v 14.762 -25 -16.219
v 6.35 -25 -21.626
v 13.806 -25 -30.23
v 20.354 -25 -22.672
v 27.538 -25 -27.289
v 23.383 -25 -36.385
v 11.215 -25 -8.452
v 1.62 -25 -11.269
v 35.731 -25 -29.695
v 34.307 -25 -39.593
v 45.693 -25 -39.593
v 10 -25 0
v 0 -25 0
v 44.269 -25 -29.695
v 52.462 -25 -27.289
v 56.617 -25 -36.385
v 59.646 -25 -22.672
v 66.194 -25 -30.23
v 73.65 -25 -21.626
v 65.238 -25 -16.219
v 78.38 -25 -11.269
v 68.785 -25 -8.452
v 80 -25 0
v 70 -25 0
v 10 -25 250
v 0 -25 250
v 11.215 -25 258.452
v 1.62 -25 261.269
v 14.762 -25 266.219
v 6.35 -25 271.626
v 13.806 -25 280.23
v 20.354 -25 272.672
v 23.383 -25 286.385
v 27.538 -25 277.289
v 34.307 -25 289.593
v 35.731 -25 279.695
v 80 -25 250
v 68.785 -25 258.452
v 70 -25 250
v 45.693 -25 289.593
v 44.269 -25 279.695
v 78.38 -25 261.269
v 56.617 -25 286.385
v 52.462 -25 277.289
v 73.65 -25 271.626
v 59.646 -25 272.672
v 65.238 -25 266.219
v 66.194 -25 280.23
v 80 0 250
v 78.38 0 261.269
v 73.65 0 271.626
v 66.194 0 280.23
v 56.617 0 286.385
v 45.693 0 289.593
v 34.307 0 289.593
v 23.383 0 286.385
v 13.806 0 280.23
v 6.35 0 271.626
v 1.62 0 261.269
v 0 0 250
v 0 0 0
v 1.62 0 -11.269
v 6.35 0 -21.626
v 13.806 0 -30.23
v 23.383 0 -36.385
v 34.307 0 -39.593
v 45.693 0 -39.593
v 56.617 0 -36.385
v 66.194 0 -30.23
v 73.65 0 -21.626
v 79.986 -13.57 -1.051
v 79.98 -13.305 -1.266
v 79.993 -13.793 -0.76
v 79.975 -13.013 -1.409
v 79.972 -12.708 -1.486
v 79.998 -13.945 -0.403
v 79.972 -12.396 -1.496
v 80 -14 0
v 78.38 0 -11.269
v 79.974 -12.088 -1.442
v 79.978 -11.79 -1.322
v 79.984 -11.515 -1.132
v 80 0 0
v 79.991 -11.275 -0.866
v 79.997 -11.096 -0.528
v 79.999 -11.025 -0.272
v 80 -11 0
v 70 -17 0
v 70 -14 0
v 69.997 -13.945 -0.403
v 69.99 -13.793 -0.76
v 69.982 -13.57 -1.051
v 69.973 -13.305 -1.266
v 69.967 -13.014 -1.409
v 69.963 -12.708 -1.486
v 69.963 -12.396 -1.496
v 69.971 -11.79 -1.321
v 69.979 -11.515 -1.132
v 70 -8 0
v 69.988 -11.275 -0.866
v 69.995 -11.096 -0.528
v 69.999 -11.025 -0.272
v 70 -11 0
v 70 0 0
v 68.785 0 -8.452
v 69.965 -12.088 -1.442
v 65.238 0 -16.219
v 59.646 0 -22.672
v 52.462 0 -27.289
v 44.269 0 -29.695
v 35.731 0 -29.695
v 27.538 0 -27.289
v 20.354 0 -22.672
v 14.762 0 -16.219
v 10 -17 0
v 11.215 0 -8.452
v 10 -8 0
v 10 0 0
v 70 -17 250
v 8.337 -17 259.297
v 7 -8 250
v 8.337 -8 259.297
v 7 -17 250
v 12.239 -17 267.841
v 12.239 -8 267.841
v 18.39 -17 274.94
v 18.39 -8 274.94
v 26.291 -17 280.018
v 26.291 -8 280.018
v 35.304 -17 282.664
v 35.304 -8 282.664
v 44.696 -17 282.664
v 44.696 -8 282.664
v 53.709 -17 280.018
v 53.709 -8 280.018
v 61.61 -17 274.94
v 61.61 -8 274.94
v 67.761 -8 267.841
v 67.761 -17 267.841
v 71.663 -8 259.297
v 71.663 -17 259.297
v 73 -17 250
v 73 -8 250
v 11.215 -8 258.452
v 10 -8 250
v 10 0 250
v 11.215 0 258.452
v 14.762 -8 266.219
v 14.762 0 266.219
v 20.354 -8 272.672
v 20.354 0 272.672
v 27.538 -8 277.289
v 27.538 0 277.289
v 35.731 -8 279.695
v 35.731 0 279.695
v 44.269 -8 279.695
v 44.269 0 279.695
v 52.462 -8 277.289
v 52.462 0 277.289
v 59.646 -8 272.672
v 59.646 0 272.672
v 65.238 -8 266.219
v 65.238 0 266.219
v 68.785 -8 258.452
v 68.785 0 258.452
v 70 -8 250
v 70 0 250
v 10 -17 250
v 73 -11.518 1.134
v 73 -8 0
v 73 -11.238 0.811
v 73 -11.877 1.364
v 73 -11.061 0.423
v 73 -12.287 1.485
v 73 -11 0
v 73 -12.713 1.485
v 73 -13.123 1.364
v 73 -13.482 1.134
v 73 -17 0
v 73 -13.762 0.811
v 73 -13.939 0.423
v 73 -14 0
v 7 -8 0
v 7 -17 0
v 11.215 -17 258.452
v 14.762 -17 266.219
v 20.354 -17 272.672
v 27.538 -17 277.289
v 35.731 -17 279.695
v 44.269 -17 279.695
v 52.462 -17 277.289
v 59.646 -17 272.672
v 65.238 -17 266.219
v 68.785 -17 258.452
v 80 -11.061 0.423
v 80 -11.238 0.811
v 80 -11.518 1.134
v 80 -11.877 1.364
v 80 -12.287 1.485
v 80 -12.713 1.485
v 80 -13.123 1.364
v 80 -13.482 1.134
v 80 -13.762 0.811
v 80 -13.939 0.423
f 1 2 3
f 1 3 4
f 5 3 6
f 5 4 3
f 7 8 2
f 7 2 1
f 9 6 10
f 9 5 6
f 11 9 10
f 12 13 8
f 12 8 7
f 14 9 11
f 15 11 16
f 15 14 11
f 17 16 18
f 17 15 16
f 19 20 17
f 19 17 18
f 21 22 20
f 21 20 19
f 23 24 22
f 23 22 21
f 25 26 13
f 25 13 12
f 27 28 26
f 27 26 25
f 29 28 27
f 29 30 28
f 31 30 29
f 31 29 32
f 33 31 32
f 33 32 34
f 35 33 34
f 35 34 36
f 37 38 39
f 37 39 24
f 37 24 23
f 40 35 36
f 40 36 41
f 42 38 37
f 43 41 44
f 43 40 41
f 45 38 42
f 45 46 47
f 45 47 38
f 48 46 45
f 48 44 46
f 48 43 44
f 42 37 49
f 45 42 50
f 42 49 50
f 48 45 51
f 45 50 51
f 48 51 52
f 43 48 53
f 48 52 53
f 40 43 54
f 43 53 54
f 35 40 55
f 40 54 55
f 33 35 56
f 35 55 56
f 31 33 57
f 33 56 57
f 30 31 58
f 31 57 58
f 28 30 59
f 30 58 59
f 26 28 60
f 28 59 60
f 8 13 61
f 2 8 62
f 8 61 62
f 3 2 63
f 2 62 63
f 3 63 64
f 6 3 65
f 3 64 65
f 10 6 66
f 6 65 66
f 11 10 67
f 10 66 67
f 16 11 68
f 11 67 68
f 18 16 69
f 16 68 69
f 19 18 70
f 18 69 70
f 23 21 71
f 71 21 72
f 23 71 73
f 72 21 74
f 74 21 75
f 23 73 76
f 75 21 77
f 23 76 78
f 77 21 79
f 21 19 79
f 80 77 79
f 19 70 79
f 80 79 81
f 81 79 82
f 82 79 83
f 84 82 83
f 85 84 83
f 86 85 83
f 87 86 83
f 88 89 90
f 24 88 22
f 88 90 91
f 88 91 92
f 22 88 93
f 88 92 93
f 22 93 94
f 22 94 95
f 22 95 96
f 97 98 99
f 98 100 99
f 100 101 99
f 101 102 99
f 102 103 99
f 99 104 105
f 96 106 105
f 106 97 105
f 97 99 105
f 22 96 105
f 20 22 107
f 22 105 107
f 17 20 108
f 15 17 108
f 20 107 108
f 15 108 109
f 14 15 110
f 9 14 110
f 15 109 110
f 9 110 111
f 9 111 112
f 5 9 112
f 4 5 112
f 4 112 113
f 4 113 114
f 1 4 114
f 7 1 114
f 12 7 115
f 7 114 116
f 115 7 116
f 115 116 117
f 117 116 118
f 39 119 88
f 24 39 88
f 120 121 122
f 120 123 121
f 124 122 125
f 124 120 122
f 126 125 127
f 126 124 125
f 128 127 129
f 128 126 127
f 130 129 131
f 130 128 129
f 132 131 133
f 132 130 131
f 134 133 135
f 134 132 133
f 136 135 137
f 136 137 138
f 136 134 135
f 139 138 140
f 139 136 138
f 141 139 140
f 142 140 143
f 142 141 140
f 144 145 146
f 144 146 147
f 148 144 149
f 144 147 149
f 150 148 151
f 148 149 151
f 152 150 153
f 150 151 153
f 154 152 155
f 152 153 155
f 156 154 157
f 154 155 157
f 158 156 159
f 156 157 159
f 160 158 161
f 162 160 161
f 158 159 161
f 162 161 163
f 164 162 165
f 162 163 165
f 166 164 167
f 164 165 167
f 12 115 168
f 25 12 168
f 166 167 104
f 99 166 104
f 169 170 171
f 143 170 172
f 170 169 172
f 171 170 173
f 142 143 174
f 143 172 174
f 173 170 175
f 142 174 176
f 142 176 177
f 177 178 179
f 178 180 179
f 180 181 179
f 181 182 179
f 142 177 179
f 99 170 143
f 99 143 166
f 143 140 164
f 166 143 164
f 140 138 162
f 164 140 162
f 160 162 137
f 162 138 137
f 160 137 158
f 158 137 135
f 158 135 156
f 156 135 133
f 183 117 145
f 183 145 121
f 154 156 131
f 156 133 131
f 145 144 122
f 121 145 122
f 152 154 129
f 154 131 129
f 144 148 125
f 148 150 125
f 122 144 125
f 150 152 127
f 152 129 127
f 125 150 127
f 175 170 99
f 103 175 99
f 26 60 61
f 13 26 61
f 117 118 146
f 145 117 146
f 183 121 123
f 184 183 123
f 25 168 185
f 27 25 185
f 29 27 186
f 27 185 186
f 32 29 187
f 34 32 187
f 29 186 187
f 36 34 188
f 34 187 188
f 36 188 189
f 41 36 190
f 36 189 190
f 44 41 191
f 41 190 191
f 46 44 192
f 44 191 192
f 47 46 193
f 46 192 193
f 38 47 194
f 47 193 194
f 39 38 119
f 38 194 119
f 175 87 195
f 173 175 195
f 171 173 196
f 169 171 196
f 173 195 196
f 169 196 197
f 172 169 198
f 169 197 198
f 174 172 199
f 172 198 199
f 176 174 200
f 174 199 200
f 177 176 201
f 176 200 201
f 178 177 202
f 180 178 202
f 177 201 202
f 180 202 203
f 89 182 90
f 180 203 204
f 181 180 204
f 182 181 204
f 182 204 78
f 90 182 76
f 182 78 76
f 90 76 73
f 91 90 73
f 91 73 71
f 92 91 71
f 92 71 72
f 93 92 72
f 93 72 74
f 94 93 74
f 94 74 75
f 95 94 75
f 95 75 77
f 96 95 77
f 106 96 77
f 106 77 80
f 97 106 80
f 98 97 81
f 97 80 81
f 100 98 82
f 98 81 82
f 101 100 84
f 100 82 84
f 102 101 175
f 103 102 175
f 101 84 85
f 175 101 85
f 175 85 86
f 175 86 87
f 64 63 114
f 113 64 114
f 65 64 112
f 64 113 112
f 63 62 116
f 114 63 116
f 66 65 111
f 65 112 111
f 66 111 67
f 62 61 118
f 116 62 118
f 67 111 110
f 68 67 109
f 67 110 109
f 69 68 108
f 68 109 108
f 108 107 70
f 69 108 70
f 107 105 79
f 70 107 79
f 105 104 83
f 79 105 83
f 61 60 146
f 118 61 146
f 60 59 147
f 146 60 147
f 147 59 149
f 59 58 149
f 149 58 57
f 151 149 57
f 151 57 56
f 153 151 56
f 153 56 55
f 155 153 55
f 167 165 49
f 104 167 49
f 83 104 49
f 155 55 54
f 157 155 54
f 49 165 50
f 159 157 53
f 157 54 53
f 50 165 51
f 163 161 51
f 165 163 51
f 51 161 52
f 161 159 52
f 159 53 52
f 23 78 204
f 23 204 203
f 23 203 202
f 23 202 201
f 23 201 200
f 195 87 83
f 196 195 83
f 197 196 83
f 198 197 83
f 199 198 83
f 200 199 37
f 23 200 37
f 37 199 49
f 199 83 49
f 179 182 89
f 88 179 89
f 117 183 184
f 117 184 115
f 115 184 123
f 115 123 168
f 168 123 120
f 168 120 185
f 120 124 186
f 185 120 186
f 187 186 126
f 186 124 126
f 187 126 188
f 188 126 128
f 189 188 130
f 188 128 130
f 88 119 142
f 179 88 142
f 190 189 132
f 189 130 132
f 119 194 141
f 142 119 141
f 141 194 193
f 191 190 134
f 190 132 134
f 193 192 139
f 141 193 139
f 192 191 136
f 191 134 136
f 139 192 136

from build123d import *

# Parameters (mm, degrees)
F1_DEPTH = 25
F2_W     = 3
F2_H     = 9
F4_R     = 1.5
F5_DEPTH = 10.0385235668


with BuildPart() as f1:
    # F0 (on Front) → F1 (new body)
    with BuildSketch(Plane.XZ):
        with BuildLine():
            Line((0, 250), (0, 0))
            ThreePointArc((0, 0), (40, -40), (80, 0))
            Line((80, 0), (80, 250))
            ThreePointArc((80, 250), (40, 290), (0, 250))
        make_face()
        with BuildLine():
            ThreePointArc((10, 250), (40, 280), (70, 250))
            Line((70, 250), (70, 0))
            ThreePointArc((70, 0), (40, -30), (10, 0))
            Line((10, 0), (10, 250))
        make_face(mode=Mode.SUBTRACT)
    extrude(amount=F1_DEPTH)

    # F3: sweep along a path in F3_path
    with BuildLine(Plane(origin=(10, -25, 0), x_dir=(0, 0, -1), z_dir=(0, 1, 0))) as f3_path:
        Line((0, 0), (-250, 0))
        ThreePointArc((-250, 0), (-280, -30), (-250, -60))
        Line((-250, -60), (0, -60))
    # F2 (on Top) → F3 (sweep, cut)
    with BuildSketch(Plane.XY):
        with Locations((8.5, -12.5)):
            Rectangle(F2_W, F2_H)
    sweep(path=f3_path.line, mode=Mode.SUBTRACT)

    # F4 (on face) → F5 (cut, through all)
    with BuildSketch(Plane.YZ.offset(80)):
        with Locations((-12.5, 0)):
            Circle(F4_R)
    extrude(amount=-F5_DEPTH, mode=Mode.SUBTRACT)


solid = f1.part
